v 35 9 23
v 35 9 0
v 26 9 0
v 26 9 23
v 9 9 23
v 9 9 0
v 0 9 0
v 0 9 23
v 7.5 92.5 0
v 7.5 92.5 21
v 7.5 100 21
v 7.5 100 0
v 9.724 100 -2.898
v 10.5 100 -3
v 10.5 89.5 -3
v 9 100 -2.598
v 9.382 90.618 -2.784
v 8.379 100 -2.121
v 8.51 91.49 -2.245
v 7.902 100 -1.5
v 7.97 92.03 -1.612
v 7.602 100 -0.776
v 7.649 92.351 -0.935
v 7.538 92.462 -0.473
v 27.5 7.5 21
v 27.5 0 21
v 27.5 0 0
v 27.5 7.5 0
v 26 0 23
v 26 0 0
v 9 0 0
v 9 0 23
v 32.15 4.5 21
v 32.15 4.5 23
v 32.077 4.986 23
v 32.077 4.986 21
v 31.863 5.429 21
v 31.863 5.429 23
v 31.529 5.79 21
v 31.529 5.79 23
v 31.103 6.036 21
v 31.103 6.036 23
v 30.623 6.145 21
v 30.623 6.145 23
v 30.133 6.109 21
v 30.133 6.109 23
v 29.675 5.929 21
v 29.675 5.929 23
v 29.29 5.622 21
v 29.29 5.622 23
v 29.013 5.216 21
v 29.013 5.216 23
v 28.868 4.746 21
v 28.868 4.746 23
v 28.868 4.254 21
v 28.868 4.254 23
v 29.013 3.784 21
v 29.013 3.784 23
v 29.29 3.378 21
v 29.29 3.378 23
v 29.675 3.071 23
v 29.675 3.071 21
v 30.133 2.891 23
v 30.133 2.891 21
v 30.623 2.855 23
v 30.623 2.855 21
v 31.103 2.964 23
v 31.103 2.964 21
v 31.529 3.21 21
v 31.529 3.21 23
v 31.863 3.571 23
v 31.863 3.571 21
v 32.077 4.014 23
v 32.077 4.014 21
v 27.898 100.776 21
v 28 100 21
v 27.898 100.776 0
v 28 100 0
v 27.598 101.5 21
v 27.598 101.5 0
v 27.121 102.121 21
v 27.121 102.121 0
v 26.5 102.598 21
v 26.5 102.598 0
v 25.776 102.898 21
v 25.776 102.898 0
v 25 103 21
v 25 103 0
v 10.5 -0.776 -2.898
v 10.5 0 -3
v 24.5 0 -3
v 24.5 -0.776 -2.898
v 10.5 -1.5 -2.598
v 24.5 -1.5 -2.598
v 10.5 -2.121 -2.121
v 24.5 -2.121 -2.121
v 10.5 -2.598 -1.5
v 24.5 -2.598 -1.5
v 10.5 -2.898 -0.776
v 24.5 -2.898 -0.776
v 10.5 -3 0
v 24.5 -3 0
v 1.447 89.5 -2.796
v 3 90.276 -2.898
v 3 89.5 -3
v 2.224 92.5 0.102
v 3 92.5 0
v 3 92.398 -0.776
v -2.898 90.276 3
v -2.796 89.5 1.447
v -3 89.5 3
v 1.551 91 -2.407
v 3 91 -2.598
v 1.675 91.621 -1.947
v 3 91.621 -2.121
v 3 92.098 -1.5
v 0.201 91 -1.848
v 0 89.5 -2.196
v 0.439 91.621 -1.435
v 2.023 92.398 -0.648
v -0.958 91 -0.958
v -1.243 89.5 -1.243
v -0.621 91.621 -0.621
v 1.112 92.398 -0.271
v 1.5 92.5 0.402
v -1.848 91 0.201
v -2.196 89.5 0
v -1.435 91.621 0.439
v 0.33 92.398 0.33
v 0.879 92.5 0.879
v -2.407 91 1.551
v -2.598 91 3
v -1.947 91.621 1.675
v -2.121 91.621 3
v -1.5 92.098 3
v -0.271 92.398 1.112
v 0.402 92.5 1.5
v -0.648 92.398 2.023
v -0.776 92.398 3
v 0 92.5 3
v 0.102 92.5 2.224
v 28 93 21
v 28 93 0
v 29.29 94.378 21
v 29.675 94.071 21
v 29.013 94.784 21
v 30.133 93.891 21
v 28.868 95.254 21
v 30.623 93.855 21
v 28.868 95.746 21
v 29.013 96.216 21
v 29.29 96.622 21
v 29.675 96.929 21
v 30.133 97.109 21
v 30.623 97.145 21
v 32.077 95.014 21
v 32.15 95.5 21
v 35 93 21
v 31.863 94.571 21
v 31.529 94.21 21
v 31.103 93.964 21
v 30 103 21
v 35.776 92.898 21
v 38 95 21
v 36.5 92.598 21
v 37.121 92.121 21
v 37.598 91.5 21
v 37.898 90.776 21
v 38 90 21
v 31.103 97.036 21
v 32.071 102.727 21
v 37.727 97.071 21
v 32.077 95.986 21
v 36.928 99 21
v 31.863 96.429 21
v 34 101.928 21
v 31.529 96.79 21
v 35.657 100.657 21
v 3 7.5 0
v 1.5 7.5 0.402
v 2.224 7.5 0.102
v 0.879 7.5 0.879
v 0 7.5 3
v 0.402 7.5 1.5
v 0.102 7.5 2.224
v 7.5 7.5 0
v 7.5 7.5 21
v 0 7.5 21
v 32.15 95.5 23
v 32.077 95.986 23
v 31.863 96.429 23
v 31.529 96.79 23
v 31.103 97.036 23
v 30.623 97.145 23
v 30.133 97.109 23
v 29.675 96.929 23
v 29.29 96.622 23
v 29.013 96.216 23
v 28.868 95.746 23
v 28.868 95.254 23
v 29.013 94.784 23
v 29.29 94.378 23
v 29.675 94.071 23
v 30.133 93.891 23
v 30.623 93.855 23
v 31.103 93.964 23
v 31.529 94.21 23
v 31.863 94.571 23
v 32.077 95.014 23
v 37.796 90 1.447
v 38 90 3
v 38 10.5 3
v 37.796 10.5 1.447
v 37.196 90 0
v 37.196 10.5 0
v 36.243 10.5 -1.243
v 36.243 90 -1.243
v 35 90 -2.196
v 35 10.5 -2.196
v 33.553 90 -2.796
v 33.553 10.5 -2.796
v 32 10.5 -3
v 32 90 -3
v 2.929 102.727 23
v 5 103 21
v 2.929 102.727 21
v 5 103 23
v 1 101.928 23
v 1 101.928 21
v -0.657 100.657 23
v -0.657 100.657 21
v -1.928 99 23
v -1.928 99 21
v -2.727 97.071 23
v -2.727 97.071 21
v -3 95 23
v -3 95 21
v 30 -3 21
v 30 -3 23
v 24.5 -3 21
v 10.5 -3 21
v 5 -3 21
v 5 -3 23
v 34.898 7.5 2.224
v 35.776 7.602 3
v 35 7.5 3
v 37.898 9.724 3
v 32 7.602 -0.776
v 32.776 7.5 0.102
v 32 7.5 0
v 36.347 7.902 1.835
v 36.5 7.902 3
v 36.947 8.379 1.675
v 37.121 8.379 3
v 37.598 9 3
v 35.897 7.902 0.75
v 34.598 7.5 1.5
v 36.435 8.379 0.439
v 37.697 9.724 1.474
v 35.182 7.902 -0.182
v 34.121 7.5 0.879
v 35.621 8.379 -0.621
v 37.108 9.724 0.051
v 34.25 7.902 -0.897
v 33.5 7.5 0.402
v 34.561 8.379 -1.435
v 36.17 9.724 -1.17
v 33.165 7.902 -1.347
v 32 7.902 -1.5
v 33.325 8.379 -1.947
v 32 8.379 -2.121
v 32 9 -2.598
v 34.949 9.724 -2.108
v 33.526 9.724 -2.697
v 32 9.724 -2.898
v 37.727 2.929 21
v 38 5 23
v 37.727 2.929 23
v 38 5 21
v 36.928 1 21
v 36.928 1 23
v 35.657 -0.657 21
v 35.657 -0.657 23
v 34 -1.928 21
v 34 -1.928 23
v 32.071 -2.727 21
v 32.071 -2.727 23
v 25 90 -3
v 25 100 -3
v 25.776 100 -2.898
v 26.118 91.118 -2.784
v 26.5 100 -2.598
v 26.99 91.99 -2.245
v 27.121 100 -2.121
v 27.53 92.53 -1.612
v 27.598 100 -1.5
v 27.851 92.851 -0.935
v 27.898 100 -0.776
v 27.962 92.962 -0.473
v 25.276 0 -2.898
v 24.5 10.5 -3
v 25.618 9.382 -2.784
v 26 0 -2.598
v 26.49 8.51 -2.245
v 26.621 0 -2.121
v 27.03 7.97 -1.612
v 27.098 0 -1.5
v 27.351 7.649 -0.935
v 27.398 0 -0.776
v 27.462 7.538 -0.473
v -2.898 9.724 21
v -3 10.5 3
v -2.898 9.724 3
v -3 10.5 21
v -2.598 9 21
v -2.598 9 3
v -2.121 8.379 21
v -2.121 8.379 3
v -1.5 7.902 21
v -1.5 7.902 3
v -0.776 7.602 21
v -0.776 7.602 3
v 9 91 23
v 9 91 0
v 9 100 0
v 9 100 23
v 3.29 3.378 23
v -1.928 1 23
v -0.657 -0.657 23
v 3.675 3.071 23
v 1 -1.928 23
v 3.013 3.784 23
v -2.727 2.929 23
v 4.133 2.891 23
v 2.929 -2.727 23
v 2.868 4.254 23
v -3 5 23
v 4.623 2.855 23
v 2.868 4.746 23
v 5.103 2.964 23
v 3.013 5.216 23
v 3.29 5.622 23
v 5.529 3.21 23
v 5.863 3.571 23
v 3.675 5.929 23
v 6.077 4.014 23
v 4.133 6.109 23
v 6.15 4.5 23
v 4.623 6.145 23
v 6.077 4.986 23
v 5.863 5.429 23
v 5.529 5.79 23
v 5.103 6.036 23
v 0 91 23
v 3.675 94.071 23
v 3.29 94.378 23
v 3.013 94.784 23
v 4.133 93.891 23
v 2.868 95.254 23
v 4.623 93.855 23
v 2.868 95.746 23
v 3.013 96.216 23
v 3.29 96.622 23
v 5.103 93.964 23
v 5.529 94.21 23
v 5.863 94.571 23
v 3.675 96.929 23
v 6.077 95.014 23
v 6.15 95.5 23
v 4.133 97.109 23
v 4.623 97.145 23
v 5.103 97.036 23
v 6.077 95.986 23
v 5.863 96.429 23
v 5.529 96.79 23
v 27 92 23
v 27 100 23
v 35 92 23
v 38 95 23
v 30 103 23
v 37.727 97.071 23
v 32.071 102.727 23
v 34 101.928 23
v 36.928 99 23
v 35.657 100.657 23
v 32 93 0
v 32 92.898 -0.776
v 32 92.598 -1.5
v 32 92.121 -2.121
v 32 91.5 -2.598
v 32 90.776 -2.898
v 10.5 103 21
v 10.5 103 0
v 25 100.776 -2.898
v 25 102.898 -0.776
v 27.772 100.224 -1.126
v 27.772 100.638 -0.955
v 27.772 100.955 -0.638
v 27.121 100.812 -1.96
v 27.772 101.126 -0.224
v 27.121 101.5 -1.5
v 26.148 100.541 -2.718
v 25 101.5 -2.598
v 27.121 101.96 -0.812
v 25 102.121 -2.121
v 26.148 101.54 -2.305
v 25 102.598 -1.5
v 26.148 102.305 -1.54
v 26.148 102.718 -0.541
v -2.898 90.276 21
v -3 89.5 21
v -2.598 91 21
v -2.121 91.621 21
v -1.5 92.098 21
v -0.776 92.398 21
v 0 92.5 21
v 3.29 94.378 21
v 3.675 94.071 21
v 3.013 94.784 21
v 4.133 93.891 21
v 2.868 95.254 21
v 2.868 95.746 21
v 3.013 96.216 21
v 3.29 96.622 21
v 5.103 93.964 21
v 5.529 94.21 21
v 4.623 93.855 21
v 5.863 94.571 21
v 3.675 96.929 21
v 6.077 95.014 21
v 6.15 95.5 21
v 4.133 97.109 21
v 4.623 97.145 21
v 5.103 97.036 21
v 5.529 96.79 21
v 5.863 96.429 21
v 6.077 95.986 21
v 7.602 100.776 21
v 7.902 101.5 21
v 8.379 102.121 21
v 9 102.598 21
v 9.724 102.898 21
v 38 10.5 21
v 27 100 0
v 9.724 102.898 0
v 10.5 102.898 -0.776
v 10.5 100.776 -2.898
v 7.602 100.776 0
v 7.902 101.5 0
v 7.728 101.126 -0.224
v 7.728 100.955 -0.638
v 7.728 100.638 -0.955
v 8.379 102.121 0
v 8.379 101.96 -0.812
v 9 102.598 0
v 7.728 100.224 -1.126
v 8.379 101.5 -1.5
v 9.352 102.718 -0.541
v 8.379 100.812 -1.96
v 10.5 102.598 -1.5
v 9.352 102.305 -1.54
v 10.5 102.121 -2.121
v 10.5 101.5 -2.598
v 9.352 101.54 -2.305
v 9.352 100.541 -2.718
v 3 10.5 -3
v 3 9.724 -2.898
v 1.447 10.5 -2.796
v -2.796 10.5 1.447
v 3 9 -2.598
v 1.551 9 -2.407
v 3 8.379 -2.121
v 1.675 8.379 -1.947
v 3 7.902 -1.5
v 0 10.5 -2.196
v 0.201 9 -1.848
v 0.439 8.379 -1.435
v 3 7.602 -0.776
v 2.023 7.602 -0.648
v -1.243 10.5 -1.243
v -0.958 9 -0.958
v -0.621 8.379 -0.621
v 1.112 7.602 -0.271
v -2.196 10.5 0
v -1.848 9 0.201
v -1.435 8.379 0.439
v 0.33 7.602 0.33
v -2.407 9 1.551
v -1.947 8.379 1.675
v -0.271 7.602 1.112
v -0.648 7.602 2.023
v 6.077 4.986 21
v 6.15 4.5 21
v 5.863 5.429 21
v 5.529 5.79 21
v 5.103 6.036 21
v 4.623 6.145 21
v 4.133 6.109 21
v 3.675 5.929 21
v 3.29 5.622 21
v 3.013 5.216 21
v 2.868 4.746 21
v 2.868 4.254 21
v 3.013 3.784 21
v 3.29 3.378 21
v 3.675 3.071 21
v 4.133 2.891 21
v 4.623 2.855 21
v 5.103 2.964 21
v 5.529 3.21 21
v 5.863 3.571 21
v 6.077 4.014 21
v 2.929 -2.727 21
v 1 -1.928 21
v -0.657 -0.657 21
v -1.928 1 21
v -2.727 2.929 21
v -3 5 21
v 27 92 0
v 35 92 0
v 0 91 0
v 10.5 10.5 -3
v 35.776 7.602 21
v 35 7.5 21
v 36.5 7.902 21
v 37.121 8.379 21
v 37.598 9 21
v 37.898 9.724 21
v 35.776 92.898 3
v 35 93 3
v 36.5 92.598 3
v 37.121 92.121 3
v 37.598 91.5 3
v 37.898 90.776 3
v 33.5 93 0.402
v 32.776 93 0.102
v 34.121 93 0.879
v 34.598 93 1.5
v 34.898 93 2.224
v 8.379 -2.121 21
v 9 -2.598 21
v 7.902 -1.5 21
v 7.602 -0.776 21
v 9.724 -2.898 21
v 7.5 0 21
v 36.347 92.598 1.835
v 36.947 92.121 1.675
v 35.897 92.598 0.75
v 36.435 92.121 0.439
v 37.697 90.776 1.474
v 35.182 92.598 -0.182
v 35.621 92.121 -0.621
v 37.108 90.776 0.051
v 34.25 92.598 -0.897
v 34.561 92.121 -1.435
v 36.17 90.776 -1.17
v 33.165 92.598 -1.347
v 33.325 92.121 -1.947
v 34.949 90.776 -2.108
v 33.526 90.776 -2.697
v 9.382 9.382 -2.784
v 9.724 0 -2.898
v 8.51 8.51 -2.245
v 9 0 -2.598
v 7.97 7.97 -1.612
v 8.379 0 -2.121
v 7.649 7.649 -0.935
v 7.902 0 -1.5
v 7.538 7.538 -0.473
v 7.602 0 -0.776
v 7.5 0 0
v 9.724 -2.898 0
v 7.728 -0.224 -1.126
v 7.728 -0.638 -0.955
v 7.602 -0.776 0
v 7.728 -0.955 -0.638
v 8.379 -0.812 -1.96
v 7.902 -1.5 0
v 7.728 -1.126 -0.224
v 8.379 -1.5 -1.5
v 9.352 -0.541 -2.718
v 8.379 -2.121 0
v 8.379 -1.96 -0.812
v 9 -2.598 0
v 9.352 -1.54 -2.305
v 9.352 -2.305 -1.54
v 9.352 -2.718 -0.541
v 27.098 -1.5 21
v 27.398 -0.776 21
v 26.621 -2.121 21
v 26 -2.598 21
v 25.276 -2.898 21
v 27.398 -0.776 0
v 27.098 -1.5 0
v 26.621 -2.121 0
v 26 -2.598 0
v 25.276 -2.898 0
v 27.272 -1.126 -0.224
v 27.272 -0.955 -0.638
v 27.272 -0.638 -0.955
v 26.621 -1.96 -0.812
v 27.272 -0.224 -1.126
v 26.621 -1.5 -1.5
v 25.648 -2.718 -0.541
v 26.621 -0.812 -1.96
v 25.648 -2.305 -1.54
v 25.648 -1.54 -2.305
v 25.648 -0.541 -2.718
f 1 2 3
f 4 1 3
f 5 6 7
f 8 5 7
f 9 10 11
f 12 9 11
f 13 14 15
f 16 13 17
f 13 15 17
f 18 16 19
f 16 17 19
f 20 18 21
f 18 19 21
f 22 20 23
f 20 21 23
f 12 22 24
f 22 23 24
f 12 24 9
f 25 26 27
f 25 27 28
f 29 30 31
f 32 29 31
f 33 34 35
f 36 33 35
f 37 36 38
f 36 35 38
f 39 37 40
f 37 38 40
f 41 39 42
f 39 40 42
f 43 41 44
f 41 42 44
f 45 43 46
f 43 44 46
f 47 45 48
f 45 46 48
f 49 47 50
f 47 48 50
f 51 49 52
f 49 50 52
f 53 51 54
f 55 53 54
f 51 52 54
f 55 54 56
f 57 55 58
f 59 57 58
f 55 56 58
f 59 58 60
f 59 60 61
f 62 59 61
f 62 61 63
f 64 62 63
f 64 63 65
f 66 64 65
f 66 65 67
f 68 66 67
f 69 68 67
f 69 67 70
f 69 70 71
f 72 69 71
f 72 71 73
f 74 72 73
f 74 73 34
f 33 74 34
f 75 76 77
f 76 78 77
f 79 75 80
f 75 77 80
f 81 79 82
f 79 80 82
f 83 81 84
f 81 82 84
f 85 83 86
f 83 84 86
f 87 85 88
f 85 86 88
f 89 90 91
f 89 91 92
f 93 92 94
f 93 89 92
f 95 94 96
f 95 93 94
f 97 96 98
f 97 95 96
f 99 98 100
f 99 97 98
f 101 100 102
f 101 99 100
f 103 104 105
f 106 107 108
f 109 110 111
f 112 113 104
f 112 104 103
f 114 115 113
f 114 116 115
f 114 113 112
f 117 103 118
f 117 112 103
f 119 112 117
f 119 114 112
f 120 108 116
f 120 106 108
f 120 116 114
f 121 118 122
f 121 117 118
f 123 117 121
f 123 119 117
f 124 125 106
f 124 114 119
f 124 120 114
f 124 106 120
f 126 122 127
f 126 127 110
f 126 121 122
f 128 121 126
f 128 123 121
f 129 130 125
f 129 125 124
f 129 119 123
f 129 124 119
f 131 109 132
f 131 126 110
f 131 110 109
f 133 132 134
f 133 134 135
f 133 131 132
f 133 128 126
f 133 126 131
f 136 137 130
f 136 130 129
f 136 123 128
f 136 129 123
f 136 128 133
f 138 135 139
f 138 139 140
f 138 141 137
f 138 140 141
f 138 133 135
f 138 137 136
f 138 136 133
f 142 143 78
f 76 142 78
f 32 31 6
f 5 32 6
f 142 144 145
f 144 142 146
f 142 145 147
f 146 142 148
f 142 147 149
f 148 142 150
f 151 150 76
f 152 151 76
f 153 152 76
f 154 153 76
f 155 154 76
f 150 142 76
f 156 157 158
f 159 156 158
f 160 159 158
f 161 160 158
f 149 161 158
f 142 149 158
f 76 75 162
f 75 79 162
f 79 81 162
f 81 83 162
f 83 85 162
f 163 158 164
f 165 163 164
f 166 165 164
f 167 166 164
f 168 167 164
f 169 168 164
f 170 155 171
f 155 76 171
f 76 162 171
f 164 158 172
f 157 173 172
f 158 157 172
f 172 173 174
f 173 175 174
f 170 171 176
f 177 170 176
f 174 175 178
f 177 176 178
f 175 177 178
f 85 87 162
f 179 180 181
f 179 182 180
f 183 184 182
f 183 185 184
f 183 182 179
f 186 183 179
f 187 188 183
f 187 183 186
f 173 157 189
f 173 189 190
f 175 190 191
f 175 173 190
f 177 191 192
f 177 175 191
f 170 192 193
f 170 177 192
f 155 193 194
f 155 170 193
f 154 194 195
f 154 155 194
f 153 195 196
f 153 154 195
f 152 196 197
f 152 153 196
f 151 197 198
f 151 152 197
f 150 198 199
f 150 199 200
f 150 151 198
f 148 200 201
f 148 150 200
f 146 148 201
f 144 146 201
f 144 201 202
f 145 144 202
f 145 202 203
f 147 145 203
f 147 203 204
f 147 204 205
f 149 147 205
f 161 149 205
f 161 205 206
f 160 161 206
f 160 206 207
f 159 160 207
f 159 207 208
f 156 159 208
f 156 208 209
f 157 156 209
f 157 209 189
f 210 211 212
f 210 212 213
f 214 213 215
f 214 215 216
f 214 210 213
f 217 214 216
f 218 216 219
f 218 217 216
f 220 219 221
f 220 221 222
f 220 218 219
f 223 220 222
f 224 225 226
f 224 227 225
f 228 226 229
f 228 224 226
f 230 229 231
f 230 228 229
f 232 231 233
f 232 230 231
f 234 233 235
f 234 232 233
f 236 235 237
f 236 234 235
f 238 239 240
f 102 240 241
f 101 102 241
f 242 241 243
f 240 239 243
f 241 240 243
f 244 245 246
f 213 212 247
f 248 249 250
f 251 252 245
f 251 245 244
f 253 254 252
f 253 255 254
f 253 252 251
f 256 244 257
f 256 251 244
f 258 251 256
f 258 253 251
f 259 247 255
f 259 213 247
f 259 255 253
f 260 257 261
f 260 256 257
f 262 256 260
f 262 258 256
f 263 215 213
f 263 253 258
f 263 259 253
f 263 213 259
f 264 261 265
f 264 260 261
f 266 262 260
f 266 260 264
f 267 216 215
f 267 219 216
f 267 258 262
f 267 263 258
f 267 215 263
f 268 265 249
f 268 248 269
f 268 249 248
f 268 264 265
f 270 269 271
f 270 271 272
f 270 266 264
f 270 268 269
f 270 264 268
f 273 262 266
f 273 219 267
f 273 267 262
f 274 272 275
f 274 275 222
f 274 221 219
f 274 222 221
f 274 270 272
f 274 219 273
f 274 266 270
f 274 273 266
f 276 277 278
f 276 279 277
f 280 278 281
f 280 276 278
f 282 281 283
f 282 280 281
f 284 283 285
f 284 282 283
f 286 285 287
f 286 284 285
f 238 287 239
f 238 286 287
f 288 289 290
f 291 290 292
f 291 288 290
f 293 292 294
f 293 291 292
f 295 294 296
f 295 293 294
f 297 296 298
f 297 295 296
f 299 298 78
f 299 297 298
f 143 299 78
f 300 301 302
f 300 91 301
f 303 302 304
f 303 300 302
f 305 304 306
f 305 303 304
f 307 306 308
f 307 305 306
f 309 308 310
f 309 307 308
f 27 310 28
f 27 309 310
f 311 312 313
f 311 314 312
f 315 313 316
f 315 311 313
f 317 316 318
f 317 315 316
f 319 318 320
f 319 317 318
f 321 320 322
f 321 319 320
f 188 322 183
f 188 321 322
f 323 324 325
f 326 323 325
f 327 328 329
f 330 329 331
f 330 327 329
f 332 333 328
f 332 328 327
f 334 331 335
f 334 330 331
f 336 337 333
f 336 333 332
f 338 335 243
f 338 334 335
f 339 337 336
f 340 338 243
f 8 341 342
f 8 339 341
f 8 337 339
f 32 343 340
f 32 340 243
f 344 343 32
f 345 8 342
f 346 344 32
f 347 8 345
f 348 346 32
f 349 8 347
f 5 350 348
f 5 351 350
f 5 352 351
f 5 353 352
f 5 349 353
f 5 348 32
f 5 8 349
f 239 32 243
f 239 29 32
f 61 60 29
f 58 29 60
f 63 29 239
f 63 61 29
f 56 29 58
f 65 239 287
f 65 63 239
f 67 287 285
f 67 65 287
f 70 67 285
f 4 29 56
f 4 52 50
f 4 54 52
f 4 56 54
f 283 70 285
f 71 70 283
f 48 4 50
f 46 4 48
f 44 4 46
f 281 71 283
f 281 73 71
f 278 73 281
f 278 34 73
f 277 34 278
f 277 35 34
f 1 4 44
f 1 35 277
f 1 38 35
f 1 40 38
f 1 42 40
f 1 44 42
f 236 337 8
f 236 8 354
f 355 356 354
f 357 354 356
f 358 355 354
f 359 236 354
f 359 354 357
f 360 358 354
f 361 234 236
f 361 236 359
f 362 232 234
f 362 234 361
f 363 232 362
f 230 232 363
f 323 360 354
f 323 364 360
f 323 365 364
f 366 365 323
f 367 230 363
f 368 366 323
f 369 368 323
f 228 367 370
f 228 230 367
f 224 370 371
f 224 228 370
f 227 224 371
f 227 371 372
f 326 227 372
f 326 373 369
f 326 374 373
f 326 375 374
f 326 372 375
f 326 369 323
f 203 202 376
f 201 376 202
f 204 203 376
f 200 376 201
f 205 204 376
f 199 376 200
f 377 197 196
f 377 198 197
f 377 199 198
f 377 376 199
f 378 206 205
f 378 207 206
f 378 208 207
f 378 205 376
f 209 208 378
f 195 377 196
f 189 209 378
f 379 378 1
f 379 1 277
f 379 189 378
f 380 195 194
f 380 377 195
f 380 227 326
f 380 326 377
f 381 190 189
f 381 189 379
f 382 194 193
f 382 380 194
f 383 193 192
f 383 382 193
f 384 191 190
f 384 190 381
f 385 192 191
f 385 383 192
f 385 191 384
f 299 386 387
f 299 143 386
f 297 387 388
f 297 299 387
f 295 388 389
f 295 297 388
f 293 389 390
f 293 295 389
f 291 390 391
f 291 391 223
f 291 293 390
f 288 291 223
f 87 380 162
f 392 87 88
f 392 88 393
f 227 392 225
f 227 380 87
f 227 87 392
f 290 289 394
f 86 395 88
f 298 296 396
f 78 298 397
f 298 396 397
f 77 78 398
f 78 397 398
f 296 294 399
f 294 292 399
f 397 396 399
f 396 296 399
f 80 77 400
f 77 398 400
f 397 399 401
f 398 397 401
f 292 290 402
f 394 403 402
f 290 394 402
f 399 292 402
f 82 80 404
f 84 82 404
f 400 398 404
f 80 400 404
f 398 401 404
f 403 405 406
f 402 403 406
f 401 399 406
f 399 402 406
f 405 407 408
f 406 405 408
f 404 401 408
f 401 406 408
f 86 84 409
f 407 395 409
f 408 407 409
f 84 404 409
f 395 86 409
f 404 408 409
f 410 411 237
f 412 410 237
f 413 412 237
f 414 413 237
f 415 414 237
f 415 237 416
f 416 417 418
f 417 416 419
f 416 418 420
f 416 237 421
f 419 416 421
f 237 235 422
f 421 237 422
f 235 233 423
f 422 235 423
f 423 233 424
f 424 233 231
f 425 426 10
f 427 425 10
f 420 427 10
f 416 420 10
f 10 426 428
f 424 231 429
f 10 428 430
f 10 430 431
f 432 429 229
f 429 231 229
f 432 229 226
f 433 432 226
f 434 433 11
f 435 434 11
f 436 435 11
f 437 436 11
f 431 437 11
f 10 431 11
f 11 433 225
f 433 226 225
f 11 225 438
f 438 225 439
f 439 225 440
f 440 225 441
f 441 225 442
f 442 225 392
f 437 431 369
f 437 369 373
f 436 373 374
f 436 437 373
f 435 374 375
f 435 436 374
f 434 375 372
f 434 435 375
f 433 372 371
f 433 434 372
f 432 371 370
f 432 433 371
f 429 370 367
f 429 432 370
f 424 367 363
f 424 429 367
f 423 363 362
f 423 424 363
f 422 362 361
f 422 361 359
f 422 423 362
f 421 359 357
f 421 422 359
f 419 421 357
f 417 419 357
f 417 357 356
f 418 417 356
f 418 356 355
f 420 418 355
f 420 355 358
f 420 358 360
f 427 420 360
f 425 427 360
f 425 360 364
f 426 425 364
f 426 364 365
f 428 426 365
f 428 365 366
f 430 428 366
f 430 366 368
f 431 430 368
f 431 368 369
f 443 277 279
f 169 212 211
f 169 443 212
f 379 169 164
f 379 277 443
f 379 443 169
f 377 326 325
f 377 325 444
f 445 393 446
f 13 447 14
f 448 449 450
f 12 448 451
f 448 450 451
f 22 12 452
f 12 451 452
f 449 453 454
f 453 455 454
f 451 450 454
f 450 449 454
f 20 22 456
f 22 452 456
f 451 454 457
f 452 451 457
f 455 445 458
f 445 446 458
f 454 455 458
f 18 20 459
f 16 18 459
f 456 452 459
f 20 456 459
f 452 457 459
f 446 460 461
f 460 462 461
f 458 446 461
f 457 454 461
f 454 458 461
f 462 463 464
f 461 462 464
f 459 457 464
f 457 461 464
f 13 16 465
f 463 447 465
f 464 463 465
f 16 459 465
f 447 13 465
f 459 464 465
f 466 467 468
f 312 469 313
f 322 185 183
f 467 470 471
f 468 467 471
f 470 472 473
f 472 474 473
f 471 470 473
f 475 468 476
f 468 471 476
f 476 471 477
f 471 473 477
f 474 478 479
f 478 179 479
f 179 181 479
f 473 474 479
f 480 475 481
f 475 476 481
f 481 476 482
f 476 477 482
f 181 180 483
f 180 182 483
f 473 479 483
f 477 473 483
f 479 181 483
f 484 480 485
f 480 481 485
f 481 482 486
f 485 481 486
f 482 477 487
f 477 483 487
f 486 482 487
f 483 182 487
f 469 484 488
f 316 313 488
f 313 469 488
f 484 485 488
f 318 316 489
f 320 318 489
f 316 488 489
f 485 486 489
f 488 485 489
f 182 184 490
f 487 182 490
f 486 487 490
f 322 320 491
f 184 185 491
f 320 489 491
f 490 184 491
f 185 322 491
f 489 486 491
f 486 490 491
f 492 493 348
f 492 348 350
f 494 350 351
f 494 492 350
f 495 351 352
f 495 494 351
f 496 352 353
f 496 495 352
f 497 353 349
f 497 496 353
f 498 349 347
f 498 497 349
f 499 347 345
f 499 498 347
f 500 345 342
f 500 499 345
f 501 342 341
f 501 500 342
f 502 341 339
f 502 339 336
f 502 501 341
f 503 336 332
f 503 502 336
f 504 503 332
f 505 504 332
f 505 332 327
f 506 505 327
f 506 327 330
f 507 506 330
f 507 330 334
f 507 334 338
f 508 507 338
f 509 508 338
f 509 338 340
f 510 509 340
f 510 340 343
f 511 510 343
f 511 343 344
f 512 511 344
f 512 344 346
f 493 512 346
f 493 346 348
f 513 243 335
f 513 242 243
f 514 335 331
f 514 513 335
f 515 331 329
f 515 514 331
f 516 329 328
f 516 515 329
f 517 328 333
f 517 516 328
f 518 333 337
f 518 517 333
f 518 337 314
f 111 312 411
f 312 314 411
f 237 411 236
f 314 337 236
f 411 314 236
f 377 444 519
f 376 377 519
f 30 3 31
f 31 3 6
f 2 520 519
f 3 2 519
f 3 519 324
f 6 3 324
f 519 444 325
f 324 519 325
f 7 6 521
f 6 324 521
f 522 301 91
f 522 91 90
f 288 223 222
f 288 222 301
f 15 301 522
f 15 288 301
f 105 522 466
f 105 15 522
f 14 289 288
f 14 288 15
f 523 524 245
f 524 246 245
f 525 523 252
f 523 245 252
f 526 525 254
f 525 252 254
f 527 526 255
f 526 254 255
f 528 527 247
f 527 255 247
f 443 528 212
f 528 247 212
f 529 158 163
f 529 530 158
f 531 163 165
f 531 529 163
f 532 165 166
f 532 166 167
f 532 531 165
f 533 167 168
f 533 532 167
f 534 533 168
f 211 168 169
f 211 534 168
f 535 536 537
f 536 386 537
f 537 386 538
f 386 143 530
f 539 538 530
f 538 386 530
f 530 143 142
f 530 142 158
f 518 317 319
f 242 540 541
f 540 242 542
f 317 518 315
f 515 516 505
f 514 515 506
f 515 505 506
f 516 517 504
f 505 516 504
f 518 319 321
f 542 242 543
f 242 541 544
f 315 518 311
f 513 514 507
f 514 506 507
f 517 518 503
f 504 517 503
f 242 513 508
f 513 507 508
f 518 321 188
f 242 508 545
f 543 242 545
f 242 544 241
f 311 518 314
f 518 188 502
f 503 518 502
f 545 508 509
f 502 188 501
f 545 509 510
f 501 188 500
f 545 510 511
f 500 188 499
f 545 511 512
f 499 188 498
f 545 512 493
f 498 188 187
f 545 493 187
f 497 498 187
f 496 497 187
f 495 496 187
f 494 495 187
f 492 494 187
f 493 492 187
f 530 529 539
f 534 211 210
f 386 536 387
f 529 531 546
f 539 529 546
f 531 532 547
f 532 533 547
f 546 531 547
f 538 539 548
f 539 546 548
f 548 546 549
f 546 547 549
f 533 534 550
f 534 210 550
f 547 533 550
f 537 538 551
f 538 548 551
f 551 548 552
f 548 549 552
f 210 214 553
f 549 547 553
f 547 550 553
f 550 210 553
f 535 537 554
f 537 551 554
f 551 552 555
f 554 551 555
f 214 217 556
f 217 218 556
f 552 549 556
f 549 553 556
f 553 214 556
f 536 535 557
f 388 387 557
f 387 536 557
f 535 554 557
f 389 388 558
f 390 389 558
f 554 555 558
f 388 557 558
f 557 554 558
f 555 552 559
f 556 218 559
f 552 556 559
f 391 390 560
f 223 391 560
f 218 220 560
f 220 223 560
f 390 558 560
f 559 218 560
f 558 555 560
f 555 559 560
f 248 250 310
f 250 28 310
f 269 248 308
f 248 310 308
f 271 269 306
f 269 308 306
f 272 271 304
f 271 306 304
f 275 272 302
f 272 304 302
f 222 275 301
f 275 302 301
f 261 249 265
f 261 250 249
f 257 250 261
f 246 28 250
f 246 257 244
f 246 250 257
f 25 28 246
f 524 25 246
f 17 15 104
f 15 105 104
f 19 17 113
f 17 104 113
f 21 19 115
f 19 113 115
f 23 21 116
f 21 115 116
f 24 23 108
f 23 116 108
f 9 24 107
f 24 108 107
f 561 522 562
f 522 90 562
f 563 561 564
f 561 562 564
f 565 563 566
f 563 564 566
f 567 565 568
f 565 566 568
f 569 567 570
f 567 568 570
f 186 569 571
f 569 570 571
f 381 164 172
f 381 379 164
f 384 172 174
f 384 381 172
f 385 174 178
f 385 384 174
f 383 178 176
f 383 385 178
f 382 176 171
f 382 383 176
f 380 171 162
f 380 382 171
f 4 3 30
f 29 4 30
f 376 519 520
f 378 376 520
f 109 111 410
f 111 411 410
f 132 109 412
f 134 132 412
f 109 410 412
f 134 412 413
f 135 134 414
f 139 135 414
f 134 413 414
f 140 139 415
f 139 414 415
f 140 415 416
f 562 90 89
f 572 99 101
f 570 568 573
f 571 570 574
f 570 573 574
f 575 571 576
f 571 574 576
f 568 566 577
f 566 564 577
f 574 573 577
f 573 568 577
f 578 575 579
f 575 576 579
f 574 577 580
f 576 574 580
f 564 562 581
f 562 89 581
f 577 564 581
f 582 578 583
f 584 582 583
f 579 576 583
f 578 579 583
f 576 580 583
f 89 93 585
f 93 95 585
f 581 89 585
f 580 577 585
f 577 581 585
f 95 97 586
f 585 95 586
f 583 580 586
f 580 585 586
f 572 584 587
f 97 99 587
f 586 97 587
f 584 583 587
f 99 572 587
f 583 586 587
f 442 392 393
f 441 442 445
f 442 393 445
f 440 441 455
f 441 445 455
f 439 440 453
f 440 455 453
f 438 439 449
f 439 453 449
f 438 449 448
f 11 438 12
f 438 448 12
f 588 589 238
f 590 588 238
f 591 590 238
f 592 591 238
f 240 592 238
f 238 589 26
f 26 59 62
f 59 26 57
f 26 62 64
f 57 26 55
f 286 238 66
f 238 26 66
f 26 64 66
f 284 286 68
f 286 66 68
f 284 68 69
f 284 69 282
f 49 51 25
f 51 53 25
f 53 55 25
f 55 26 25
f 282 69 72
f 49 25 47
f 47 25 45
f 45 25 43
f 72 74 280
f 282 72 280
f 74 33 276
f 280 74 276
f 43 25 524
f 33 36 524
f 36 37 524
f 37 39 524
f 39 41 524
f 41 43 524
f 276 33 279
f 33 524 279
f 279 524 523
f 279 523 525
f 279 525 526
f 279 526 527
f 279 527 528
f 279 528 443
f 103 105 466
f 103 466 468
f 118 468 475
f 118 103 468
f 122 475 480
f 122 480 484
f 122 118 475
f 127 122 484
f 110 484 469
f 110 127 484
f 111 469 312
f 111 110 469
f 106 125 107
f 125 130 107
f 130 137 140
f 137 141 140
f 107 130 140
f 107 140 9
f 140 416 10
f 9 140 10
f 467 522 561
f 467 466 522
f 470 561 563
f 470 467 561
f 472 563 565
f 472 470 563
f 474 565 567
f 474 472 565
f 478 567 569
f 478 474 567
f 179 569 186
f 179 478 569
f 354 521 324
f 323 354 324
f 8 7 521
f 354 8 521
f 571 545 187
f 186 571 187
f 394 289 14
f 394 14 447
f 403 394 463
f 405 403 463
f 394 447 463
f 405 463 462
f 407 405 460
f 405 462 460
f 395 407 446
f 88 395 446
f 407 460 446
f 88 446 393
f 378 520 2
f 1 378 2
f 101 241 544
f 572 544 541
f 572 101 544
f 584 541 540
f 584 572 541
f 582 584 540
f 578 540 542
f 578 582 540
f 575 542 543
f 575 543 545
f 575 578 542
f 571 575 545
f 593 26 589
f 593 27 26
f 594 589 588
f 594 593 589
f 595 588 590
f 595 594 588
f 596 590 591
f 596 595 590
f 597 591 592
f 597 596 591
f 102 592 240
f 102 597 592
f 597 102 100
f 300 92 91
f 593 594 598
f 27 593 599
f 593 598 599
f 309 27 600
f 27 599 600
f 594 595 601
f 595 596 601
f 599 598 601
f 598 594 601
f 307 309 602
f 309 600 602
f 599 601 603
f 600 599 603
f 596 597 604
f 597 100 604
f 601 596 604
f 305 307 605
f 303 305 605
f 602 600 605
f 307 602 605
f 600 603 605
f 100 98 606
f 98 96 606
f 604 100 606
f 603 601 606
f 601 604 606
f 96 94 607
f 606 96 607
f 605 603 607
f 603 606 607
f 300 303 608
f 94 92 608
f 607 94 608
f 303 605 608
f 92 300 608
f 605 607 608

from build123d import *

# Parameters (mm, degrees)
SKETCH_2_W          = 41
SKETCH_2_H          = 106
SKETCH_2_R          = 1.65
EXTRUDE_3_DEPTH     = 23
SKETCH_5_R          = 1.65
CUT_EXTRUDE_2_DEPTH = 113.169514575
SKETCH_6_W          = 41
SKETCH_6_H          = 106
EXTRUDE_4_DEPTH     = 3
CUT_EXTRUDE_START   = -2
SKETCH_7_W          = 10.5
SKETCH_7_H          = 10.5
SKETCH_7_W_2        = 10
SKETCH_7_H_2        = 10
CUT_EXTRUDE_3_DEPTH = 111.822870022
FILLET_1_R          = 8
FILLET_2_R          = 6
FILLET_3_R          = 3


with BuildPart() as part:
    # 草图2 → 凸台-拉伸3 (new body)
    with BuildSketch(Plane.XY):
        with Locations((17.5, 50)):
            Rectangle(SKETCH_2_W, SKETCH_2_H)
        Polygon((9, 0), (9, 9), (0, 9), (0, 91), (9, 91), (9, 100), (27, 100), (27, 92), (35, 92), (35, 9), (26, 9), (26, 0), align=None, mode=Mode.SUBTRACT)
        with Locations((4.5, 4.5)):
            Circle(SKETCH_2_R, mode=Mode.SUBTRACT)
        with Locations((4.5, 95.5)):
            Circle(SKETCH_2_R, mode=Mode.SUBTRACT)
        with Locations((30.5, 95.5)):
            Circle(SKETCH_2_R, mode=Mode.SUBTRACT)
    extrude(amount=EXTRUDE_3_DEPTH)

    # 草图5 → 切除-拉伸2 (cut, through all)
    with BuildSketch(Plane.XY.offset(23)):
        with Locations((30.5, 4.5)):
            Circle(SKETCH_5_R)
    extrude(amount=-CUT_EXTRUDE_2_DEPTH, mode=Mode.SUBTRACT)

    # 草图6 → 凸台-拉伸4 (add)
    with BuildSketch(Plane(origin=(0, 0, 0), x_dir=(-1, 0, 0), z_dir=(0, 0, -1))):
        with Locations((-17.5, 50)):
            Rectangle(SKETCH_6_W, SKETCH_6_H)
    extrude(amount=EXTRUDE_4_DEPTH)

    # 草图7 → 切除-拉伸3 (cut, through all)
    with BuildSketch(Plane.XY.offset(23).offset(CUT_EXTRUDE_START)):
        with Locations((2.25, 97.75)):
            Rectangle(SKETCH_7_W, SKETCH_7_H)
        with Locations((33, 98)):
            Rectangle(SKETCH_7_W_2, SKETCH_7_H_2)
        with Locations((2.25, 2.25)):
            Rectangle(SKETCH_7_W, SKETCH_7_H)
        with Locations((32.75, 2.25)):
            Rectangle(SKETCH_7_W, SKETCH_7_H)
    extrude(amount=-CUT_EXTRUDE_3_DEPTH, mode=Mode.SUBTRACT)

    # 圆角1
    fillet_1_edges = [part.edges().sort_by_distance(p)[0] for p in [
        (-3, -3, 22),
        (-3, 103, 22),
        (38, 103, 22),
        (38, -3, 22),
    ]]
    fillet(fillet_1_edges, radius=FILLET_1_R)

    # 圆角2
    fillet_2_edges = [part.edges().sort_by_distance(p)[0] for p in [
        (38, 50.25, -3),
        (-3, 50, -3),
    ]]
    fillet(fillet_2_edges, radius=FILLET_2_R)

    # 圆角3
    fillet_3_edges = [part.edges().sort_by_distance(p)[0] for p in [
        (17.5, -3, -3),
        (17.75, 103, -3),
        (27.5, -3, 9),
        (27.5, 2.25, -3),
        (7.5, 103, 9),
        (7.5, 97.75, -3),
        (28, 98, -3),
        (28, 103, 9),
        (7.5, 2.25, -3),
        (7.5, -3, 9),
        (29.75, 7.5, -3),
        (5.25, 7.5, -3),
        (5.25, 92.5, -3),
        (30, 93, -3),
        (-3, 92.5, 12),
        (-1.242640687, 92.5, -1.242640687),
        (-3, 7.5, 12),
        (-1.242640687, 7.5, -1.242640687),
        (38, 7.5, 12),
        (36.242640687, 7.5, -1.242640687),
        (38, 93, 12),
        (36.242640687, 93, -1.242640687),
    ]]
    fillet(fillet_3_edges, radius=FILLET_3_R)


solid = part.part
